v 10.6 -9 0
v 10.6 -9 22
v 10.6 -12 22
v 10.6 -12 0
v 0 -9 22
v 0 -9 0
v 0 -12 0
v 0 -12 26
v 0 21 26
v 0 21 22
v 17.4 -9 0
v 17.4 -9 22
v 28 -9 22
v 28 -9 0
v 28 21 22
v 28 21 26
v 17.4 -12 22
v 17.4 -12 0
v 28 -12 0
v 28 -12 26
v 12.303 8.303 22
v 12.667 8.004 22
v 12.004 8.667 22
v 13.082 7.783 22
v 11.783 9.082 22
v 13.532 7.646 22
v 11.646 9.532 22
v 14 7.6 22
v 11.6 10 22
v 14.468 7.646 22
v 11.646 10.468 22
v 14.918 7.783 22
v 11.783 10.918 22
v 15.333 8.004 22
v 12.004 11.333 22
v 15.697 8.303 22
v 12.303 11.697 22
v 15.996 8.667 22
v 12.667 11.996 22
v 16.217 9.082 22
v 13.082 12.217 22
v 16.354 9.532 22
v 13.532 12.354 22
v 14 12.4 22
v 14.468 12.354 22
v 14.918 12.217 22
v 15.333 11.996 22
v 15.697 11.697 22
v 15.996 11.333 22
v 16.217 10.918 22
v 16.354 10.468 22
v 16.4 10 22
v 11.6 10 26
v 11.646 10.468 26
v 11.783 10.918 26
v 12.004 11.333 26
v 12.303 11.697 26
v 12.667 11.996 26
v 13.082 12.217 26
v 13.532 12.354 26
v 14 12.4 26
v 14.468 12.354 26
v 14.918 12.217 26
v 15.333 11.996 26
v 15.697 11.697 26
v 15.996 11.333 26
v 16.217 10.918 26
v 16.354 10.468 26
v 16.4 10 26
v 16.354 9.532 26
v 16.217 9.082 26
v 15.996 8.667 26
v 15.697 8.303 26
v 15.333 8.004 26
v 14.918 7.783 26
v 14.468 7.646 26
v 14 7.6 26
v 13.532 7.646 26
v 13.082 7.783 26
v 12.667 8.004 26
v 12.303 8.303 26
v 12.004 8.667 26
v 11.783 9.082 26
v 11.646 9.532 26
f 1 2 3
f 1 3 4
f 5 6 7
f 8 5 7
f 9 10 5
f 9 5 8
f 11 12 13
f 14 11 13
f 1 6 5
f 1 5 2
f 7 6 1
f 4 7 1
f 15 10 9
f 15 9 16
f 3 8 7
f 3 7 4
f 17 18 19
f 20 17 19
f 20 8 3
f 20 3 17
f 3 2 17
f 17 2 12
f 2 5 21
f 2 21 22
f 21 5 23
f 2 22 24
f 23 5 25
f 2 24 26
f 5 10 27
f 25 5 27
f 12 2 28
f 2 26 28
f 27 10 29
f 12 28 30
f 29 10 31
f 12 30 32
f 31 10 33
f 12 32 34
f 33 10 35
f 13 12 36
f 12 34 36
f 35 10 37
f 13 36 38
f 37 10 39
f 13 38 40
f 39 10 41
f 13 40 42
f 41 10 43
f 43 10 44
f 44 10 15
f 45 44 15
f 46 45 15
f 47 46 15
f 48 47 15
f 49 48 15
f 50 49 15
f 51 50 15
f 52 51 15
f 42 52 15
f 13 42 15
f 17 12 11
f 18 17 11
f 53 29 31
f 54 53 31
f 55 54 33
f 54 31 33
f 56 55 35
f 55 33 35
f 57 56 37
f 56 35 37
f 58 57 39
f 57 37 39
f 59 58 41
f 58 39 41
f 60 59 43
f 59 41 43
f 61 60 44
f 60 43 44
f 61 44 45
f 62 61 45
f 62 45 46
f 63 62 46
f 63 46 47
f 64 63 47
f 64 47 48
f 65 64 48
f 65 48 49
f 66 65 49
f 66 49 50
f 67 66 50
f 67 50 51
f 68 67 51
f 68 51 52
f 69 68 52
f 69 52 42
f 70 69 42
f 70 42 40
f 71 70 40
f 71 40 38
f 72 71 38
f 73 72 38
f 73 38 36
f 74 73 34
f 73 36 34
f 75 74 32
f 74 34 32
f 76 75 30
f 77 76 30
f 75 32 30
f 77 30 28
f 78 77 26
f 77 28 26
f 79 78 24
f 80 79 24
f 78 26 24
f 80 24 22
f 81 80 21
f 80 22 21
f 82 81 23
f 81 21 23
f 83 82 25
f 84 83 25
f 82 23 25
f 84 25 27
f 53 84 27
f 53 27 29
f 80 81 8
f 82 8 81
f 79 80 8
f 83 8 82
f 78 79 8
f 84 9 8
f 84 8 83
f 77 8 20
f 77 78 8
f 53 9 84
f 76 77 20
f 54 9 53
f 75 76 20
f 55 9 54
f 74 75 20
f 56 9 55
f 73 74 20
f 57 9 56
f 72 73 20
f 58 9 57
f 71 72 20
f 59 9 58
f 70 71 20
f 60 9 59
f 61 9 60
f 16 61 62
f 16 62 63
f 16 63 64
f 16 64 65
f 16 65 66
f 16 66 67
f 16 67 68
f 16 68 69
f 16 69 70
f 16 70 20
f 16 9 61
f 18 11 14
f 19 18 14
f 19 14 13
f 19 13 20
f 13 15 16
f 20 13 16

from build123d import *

# Parameters (mm, degrees)
SKETCH1_W           = 28
SKETCH1_H           = 28
BOSS_EXTRUDE1_DEPTH = 25
SKETCH2_W           = 28
SKETCH2_H           = 22
CUT_EXTRUDE1_DEPTH  = 22
SKETCH3_W           = 6.8
SKETCH3_H           = 22
CUT_EXTRUDE2_DEPTH  = 46.299006612
SKETCH4_R           = 2.4
CUT_EXTRUDE3_DEPTH  = 44.508619836
SKETCH5_W           = 28
SKETCH5_H           = 6
CUT_EXTRUDE4_DEPTH  = 4
SKETCH6_W           = 2
SKETCH6_H           = 21
CUT_EXTRUDE5_DEPTH  = 45.821869662
SKETCH7_W           = 28
SKETCH7_H           = 26
BOSS_EXTRUDE2_DEPTH = 12
SKETCH9_W           = 6.8
SKETCH9_H           = 22
CUT_EXTRUDE6_DEPTH  = 12
SKETCH10_W          = 28
SKETCH10_H          = 22
CUT_EXTRUDE7_DEPTH  = 12


with BuildPart() as part:
    # Sketch1 → Boss-Extrude1 (new body)
    with BuildSketch(Plane(origin=(0, 0, 0), x_dir=(1, 0, 0), z_dir=(0, 1, 0))):
        with Locations((14, -14)):
            Rectangle(SKETCH1_W, SKETCH1_H)
    extrude(amount=BOSS_EXTRUDE1_DEPTH)

    # Sketch2 → Cut-Extrude1 (cut)
    with BuildSketch(Plane(origin=(0, 25, 0), x_dir=(1, 0, 0), z_dir=(0, 1, 0))):
        with Locations((14, -11)):
            Rectangle(SKETCH2_W, SKETCH2_H)
    extrude(amount=-CUT_EXTRUDE1_DEPTH, mode=Mode.SUBTRACT)

    # Sketch3 → Cut-Extrude2 (cut, through all)
    with BuildSketch(Plane(origin=(0, 3, 0), x_dir=(1, 0, 0), z_dir=(0, 1, 0))):
        with Locations((14, -11)):
            Rectangle(SKETCH3_W, SKETCH3_H)
    extrude(amount=-CUT_EXTRUDE2_DEPTH, mode=Mode.SUBTRACT)

    # Sketch4 → Cut-Extrude3 (cut, through all)
    with BuildSketch(Plane(origin=(0, 0, 22), x_dir=(-1, 0, 0), z_dir=(0, 0, -1))):
        with Locations((-14, 10)):
            Circle(SKETCH4_R)
    extrude(amount=-CUT_EXTRUDE3_DEPTH, mode=Mode.SUBTRACT)

    # Sketch5 → Cut-Extrude4 (cut)
    with BuildSketch(Plane(origin=(0, 25, 0), x_dir=(1, 0, 0), z_dir=(0, 1, 0))):
        with Locations((14, -25)):
            Rectangle(SKETCH5_W, SKETCH5_H)
    extrude(amount=-CUT_EXTRUDE4_DEPTH, mode=Mode.SUBTRACT)

    # Sketch6 → Cut-Extrude5 (cut, through all)
    with BuildSketch(Plane(origin=(28, 0, 0), x_dir=(0, 0, -1), z_dir=(1, 0, 0))):
        with Locations((-27, 10.5)):
            Rectangle(SKETCH6_W, SKETCH6_H)
    extrude(amount=-CUT_EXTRUDE5_DEPTH, mode=Mode.SUBTRACT)

    # Sketch7 → Boss-Extrude2 (add)
    with BuildSketch(Plane.XZ):
        with Locations((14, 13)):
            Rectangle(SKETCH7_W, SKETCH7_H)
    extrude(amount=BOSS_EXTRUDE2_DEPTH)

    # Sketch9 → Cut-Extrude6 (cut)
    with BuildSketch(Plane(origin=(0, 0, 0), x_dir=(1, 0, 0), z_dir=(0, 1, 0))):
        with Locations((14, -11)):
            Rectangle(SKETCH9_W, SKETCH9_H)
    extrude(amount=-CUT_EXTRUDE6_DEPTH, mode=Mode.SUBTRACT)

    # Sketch10 → Cut-Extrude7 (cut)
    with BuildSketch(Plane(origin=(0, 3, 0), x_dir=(1, 0, 0), z_dir=(0, 1, 0))):
        with Locations((14, -11)):
            Rectangle(SKETCH10_W, SKETCH10_H)
    extrude(amount=-CUT_EXTRUDE7_DEPTH, mode=Mode.SUBTRACT)


solid = part.part
